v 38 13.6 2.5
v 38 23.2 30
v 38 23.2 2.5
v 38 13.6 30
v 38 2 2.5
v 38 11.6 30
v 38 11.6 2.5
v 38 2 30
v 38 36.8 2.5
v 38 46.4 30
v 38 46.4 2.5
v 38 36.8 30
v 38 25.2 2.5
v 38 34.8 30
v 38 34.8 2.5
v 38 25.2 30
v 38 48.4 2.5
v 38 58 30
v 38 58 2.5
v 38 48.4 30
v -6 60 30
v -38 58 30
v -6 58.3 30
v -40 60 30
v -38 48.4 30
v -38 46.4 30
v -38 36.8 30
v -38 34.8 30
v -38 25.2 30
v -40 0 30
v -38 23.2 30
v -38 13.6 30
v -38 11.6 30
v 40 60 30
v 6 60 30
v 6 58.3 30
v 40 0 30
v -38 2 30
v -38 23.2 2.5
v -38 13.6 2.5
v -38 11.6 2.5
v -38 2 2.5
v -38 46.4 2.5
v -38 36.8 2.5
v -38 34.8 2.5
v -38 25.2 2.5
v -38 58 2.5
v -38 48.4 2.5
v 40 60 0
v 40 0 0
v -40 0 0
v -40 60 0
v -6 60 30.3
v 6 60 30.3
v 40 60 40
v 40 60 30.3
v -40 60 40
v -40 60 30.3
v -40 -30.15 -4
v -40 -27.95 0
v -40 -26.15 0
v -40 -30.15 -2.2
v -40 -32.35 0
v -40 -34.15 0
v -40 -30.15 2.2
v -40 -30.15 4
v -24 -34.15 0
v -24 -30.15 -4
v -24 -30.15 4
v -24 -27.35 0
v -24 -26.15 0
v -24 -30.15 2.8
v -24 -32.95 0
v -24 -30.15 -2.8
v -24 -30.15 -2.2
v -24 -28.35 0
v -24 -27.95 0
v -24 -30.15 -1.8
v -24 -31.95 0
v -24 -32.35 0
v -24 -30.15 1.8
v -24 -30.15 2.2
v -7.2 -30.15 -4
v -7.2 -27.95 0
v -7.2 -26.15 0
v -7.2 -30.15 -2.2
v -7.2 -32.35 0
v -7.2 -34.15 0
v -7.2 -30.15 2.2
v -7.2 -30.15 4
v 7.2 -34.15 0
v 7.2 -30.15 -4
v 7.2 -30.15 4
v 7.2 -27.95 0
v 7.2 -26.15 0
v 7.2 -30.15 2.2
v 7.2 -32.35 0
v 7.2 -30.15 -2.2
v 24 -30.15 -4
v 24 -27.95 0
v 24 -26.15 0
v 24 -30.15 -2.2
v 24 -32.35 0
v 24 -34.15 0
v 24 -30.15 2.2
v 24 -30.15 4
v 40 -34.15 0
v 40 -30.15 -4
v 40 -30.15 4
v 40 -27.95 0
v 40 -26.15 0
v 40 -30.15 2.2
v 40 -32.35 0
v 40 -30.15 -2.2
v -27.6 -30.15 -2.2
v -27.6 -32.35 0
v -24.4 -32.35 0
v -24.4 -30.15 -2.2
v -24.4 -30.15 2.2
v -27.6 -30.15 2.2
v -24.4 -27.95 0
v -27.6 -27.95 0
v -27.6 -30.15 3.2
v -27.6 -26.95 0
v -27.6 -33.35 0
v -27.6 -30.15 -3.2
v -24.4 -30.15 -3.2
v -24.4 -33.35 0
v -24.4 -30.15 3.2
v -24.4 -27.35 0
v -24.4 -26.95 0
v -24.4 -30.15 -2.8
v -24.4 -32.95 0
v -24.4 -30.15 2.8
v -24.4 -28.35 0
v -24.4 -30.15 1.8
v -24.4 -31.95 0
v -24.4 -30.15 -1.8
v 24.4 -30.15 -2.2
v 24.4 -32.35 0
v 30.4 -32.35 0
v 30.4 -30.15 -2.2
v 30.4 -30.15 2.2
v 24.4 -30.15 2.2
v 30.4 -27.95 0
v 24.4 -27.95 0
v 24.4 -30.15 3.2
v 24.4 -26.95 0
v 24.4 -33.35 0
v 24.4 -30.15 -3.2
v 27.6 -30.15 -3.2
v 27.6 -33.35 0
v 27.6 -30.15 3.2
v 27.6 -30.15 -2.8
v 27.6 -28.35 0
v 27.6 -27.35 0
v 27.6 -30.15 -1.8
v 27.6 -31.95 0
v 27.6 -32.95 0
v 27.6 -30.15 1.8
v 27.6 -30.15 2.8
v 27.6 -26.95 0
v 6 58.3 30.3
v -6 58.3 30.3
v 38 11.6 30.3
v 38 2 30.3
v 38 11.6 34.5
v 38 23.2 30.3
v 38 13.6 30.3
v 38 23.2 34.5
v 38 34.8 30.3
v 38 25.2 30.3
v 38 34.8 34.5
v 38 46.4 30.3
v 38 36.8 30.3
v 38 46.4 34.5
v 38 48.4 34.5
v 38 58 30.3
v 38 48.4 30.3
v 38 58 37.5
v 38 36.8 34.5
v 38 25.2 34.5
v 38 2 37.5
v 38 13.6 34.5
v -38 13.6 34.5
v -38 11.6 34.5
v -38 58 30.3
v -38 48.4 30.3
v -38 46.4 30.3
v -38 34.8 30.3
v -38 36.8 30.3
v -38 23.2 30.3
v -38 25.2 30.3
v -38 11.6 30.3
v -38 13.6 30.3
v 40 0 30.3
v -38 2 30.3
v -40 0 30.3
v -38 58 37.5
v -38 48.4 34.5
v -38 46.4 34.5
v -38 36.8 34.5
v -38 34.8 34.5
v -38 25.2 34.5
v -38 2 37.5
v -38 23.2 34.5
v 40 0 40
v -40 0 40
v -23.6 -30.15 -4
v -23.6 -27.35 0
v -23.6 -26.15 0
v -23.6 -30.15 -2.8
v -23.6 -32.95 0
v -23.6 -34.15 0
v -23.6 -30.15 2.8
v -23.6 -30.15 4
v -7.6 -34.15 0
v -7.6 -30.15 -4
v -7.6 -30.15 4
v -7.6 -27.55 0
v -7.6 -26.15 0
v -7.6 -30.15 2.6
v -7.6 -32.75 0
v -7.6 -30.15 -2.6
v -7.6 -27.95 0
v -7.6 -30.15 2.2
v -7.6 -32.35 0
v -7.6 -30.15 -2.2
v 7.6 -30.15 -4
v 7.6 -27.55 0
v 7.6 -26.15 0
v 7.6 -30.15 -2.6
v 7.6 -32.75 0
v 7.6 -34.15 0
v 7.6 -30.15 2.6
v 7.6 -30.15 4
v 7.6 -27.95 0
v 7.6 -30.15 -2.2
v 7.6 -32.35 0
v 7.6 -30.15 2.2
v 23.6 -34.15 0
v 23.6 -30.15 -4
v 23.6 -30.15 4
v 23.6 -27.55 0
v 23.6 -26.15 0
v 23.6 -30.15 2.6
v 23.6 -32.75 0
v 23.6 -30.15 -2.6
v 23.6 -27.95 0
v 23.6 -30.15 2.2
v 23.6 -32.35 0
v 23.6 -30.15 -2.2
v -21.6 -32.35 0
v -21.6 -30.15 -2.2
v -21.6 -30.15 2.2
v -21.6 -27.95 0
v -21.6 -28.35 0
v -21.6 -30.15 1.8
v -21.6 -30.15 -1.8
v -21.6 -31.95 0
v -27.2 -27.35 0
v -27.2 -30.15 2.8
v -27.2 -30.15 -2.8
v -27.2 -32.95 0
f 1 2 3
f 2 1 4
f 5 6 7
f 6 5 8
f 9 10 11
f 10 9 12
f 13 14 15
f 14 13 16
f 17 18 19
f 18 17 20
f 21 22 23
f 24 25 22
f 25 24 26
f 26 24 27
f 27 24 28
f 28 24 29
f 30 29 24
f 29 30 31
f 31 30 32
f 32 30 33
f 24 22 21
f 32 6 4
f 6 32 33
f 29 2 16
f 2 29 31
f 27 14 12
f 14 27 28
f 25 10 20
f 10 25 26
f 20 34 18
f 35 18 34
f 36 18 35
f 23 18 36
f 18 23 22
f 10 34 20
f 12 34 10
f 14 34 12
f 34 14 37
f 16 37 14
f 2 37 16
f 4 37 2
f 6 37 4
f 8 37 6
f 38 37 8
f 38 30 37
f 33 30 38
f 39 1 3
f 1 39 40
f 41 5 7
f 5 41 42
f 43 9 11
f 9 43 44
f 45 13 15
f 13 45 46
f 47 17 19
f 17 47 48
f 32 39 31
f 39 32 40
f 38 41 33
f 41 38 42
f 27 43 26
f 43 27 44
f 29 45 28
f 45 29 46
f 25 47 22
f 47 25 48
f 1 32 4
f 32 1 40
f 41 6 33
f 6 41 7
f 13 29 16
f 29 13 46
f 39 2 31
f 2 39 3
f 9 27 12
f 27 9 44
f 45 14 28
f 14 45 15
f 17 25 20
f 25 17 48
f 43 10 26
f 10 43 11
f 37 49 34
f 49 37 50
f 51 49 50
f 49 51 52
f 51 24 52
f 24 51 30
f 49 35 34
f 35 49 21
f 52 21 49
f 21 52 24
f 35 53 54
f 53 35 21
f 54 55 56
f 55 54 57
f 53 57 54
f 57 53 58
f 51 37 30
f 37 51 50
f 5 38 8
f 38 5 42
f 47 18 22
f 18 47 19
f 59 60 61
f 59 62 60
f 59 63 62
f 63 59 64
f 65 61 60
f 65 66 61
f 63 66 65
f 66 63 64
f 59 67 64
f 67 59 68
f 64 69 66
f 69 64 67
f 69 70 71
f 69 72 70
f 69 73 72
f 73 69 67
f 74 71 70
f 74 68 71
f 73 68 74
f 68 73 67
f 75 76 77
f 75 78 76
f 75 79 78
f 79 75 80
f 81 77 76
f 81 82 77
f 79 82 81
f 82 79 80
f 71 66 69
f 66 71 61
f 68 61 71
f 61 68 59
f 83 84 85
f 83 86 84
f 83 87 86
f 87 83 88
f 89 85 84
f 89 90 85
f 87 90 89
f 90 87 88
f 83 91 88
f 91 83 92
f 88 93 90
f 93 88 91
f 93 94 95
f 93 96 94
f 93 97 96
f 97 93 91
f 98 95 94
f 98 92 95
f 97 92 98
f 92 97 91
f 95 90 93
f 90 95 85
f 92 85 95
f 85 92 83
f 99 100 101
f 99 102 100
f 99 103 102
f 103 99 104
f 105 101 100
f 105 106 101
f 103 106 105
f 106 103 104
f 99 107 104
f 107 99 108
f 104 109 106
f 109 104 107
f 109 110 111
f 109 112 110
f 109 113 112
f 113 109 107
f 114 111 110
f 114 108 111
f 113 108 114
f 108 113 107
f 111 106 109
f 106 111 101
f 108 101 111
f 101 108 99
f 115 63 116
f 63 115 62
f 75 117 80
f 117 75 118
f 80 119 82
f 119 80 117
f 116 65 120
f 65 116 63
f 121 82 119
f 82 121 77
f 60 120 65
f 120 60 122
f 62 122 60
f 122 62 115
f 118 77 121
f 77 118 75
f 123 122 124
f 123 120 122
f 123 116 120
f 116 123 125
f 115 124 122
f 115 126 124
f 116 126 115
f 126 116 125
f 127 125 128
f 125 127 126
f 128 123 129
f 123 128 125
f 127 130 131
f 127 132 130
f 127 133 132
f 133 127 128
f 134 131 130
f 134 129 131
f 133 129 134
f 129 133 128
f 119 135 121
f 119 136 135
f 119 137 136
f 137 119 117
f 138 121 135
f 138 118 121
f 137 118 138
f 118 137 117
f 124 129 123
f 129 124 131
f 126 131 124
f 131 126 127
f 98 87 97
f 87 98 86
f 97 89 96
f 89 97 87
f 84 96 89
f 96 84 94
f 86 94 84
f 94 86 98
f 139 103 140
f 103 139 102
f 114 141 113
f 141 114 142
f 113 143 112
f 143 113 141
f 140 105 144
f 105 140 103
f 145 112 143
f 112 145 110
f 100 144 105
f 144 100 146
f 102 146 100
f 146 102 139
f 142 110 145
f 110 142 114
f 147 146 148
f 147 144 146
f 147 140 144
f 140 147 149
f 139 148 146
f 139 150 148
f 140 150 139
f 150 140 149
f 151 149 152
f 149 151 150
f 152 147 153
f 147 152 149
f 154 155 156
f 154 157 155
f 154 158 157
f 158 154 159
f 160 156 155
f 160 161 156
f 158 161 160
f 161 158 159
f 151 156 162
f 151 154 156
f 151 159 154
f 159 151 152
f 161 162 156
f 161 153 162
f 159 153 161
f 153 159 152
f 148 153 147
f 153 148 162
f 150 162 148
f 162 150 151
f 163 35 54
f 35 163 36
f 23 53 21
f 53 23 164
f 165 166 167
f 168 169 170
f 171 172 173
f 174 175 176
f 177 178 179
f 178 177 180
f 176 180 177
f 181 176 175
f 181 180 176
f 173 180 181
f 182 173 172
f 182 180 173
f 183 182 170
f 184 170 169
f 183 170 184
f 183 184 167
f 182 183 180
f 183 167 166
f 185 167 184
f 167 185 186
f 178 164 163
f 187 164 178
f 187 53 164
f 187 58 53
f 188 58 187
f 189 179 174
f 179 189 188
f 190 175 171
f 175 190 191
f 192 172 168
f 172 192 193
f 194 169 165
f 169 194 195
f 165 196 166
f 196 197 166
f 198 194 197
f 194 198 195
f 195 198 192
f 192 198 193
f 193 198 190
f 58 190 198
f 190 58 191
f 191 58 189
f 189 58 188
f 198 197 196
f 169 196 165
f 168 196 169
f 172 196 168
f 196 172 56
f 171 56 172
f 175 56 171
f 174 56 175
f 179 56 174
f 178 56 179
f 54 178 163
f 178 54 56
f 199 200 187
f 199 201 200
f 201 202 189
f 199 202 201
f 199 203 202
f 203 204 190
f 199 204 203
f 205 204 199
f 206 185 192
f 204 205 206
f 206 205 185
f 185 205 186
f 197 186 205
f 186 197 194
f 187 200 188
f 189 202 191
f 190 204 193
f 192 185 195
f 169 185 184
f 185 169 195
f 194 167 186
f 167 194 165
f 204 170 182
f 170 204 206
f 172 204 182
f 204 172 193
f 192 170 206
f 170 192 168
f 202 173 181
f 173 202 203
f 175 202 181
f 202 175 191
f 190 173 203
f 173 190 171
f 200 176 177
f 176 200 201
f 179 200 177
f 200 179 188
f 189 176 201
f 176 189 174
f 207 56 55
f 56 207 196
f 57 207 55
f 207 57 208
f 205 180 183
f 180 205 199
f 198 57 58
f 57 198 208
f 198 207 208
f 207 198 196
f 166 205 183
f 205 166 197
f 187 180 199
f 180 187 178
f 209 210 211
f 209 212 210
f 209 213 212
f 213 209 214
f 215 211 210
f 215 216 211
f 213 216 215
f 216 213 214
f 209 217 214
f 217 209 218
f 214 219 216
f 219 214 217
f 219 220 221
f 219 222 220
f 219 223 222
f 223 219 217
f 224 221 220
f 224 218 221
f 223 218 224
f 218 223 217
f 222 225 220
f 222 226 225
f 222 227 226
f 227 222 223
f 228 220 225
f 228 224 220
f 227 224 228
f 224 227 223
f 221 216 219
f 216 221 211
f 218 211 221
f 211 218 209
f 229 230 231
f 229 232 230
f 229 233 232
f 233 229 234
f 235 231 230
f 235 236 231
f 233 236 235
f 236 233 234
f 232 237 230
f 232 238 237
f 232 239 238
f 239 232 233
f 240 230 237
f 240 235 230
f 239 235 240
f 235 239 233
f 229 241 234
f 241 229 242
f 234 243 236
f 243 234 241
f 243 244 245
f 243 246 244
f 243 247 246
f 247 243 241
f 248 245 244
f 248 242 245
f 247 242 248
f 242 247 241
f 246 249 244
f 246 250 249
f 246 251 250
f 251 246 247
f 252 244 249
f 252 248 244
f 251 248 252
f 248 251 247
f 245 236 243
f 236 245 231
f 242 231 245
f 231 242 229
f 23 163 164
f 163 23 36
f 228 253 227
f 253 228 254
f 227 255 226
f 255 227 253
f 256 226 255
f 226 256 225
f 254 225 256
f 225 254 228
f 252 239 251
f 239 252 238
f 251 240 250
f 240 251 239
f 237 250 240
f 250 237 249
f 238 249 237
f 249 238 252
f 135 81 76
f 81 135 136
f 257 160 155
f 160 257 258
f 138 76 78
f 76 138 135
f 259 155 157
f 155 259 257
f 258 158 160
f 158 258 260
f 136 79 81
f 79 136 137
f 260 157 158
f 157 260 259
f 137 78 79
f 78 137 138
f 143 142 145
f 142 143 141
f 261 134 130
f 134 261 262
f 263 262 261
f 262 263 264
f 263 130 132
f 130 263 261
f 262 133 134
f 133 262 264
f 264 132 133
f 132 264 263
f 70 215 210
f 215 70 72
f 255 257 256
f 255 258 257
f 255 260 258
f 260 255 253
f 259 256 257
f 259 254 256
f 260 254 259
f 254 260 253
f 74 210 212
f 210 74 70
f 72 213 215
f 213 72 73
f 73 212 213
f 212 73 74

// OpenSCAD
/* Box with print-in-place hinge - step 1: params + base */
part = "assembly"; // [base, lid, pin, assembly]

cadverify_only = "";
module instance(name, part, unit = 1) {
    echo(cadverify_instance = [name, part, unit]);
    if (cadverify_only == "" || cadverify_only == name) children();
}

// ---- parameters (mm) ----
W = 80; D = 60; H = 40;          // body outer, closed
baseH = 30;                      // base height
gapZLid = 0.3;                   // lid-base vertical gap
lidBot = baseH + gapZLid;        // 30.3
lidTop = H;                      // 40
axY = 0; axZ = baseH + gapZLid/2; // hinge axis (0, 30.15)
wallT = 2; floorT = 2.5; lidTopT = 2.5;
pinH = 1.8; boreH = 2.2; outH = 4.0; cbH = 3.2; capH = 2.8;
clrR = 0.4; clrA = 0.4;
divT = 2; divTop = 37.2;

// knuckle X intervals
bx10=-40; bx11=-24; lx10=-23.6; lx11=-7.6;
bx20=-7.2; bx21=7.2; lx20=7.6; lx21=23.6; bx30=24; bx31=40;

// generic prism along X from polygon in (Z,Y) mapped: poly points [z,y]
module prism_x(poly, x0, len) {
    translate([x0, 0, 0]) rotate([0,90,0])
        linear_extrude(height=len) polygon(poly);
}
function diamond(h) = [[-h,0],[0,-h],[h,0],[0,h]];

module knuckle_out(x0, len) {
    // diamond cross-section points [z,y] centered at (axZ, axY)
    p = diamond(outH);
    translate([0, axY, axZ]) prism_x(p, x0, len);
}
module bore_small(x0, len) {
    p = diamond(boreH);
    translate([0, axY, axZ]) prism_x(p, x0, len);
}
module bore_cb(x0, len) {
    p = diamond(cbH);
    translate([0, axY, axZ]) prism_x(p, x0, len);
}

function D(h,y0,z0) = [[y0-h,-z0],[y0,-z0-h],[y0+h,-z0],[y0,-z0+h]];
module dia(h,y0,z0,x0,x1) {
    translate([x0,0,0]) rotate([0,90,0])
        linear_extrude(height=x1-x0, convexity=4) polygon(D(h,y0,z0));
}
module base_geo() {
    difference() {
        union() {
            translate([-40,0,0]) cube([80,60,2.5]);            // floor
            translate([-40,0,0]) cube([80,2,30]);              // back wall
            translate([-40,58,0]) cube([80,2,30]);             // front wall
            translate([-40,2,0]) cube([2,56,30]);              // left wall
            translate([38,2,0]) cube([2,56,30]);               // right wall
            for (cy=[12.6,24.2,35.8,47.4])
                translate([-38,cy-1,2.5]) cube([76,2,27.5]);   // dividers
            dia(outH,0,axZ,bx10,bx11);                         // knuckles
            dia(outH,0,axZ,bx20,bx21);
            dia(outH,0,axZ,bx30,bx31);
        }
        // bore channels + cap pockets
        dia(boreH,0,axZ,bx10,bx11); dia(cbH,0,axZ,-27.6,-24.4);
        dia(boreH,0,axZ,bx20,bx21);
        dia(boreH,0,axZ,bx30,bx31); dia(cbH,0,axZ,24.4,27.6);
        // back-wall notches under lid knuckles
        dia(boreH+clrR,0,axZ,lx10,lx11);
        dia(boreH+clrR,0,axZ,lx20,lx21);
        // catch groove in front wall outer face
        translate([-6,58.8,27.5]) cube([12,1.21,1.5]);
    }
}

module lid_geo() {
    difference() {
        union() {
            // top plate: x -40..40, y 0..60, z 37.5..40
            translate([-40,0,37.5]) cube([80,60,2.5]);
            // lid skirt walls 2mm, y 0..60, z 30.3..37.5
            translate([-40,0,30.3]) cube([80,2,7.2]);    // back band
            translate([-40,58,30.3]) cube([80,2,7.2]);   // front band
            translate([-40,2,30.3]) cube([2,56,7.2]);    // left band
            translate([38,2,30.3]) cube([2,56,7.2]);     // right band
            // lid skirt inner closure panels (also skirt divider walls)
            for (cy=[12.6,24.2,35.8,47.4])
                translate([-38,cy-1,30.3]) cube([76,2,4.2]);  // up to 34.5
            // lid knuckles + catch tongue
            dia(outH,0,axZ,lx10,lx11);
            dia(outH,0,axZ,lx20,lx21);
            translate([-6,58.3,27.5]) cube([12,1.7,3.4]);  // tongue tab below front band
        }
        // bore channels
        dia(boreH,0,axZ,lx10,lx11);
        dia(boreH,0,axZ,lx20,lx21);
        // clearance pockets opposite base knuckles
        dia(boreH+clrR,0,axZ,-27.6,-23.6);
        dia(boreH+clrR,0,axZ,-7.6,-7.2);
        dia(boreH+clrR,0,axZ,7.2,7.6);
        dia(boreH+clrR,0,axZ,23.6,27.6);
    }
}
module pin_geo() {
    difference() {
        union() {
            // shaft L..R : x -24.4..27.6 + right cap to 30.4
            dia(pinH,0,axZ,-24.4,27.6);
            dia(capH,0,axZ,27.6,30.4);       // right cap head
            dia(capH,0,axZ,-27.2,-24.4);     // left cap head
            // stop collar next to left head
            dia(capH,0,axZ,-24.0,-21.6);
        }
        // left head slot (screwdriver)
        translate([-26.6,-1.1,axZ-14]) cube([2.2,2.2,14]);
    }
}
// --- part orientation helpers + spec + assembly ---

if (part=="base") { base_geo(); }
else if (part=="lid") { lid_geo(); }
else if (part=="pin") { pin_geo(); }
else if (part=="assembly") {
    instance("base","base") base_geo();
    instance("lid","lid") lid_geo();
    instance("pin","pin") pin_geo();
}
